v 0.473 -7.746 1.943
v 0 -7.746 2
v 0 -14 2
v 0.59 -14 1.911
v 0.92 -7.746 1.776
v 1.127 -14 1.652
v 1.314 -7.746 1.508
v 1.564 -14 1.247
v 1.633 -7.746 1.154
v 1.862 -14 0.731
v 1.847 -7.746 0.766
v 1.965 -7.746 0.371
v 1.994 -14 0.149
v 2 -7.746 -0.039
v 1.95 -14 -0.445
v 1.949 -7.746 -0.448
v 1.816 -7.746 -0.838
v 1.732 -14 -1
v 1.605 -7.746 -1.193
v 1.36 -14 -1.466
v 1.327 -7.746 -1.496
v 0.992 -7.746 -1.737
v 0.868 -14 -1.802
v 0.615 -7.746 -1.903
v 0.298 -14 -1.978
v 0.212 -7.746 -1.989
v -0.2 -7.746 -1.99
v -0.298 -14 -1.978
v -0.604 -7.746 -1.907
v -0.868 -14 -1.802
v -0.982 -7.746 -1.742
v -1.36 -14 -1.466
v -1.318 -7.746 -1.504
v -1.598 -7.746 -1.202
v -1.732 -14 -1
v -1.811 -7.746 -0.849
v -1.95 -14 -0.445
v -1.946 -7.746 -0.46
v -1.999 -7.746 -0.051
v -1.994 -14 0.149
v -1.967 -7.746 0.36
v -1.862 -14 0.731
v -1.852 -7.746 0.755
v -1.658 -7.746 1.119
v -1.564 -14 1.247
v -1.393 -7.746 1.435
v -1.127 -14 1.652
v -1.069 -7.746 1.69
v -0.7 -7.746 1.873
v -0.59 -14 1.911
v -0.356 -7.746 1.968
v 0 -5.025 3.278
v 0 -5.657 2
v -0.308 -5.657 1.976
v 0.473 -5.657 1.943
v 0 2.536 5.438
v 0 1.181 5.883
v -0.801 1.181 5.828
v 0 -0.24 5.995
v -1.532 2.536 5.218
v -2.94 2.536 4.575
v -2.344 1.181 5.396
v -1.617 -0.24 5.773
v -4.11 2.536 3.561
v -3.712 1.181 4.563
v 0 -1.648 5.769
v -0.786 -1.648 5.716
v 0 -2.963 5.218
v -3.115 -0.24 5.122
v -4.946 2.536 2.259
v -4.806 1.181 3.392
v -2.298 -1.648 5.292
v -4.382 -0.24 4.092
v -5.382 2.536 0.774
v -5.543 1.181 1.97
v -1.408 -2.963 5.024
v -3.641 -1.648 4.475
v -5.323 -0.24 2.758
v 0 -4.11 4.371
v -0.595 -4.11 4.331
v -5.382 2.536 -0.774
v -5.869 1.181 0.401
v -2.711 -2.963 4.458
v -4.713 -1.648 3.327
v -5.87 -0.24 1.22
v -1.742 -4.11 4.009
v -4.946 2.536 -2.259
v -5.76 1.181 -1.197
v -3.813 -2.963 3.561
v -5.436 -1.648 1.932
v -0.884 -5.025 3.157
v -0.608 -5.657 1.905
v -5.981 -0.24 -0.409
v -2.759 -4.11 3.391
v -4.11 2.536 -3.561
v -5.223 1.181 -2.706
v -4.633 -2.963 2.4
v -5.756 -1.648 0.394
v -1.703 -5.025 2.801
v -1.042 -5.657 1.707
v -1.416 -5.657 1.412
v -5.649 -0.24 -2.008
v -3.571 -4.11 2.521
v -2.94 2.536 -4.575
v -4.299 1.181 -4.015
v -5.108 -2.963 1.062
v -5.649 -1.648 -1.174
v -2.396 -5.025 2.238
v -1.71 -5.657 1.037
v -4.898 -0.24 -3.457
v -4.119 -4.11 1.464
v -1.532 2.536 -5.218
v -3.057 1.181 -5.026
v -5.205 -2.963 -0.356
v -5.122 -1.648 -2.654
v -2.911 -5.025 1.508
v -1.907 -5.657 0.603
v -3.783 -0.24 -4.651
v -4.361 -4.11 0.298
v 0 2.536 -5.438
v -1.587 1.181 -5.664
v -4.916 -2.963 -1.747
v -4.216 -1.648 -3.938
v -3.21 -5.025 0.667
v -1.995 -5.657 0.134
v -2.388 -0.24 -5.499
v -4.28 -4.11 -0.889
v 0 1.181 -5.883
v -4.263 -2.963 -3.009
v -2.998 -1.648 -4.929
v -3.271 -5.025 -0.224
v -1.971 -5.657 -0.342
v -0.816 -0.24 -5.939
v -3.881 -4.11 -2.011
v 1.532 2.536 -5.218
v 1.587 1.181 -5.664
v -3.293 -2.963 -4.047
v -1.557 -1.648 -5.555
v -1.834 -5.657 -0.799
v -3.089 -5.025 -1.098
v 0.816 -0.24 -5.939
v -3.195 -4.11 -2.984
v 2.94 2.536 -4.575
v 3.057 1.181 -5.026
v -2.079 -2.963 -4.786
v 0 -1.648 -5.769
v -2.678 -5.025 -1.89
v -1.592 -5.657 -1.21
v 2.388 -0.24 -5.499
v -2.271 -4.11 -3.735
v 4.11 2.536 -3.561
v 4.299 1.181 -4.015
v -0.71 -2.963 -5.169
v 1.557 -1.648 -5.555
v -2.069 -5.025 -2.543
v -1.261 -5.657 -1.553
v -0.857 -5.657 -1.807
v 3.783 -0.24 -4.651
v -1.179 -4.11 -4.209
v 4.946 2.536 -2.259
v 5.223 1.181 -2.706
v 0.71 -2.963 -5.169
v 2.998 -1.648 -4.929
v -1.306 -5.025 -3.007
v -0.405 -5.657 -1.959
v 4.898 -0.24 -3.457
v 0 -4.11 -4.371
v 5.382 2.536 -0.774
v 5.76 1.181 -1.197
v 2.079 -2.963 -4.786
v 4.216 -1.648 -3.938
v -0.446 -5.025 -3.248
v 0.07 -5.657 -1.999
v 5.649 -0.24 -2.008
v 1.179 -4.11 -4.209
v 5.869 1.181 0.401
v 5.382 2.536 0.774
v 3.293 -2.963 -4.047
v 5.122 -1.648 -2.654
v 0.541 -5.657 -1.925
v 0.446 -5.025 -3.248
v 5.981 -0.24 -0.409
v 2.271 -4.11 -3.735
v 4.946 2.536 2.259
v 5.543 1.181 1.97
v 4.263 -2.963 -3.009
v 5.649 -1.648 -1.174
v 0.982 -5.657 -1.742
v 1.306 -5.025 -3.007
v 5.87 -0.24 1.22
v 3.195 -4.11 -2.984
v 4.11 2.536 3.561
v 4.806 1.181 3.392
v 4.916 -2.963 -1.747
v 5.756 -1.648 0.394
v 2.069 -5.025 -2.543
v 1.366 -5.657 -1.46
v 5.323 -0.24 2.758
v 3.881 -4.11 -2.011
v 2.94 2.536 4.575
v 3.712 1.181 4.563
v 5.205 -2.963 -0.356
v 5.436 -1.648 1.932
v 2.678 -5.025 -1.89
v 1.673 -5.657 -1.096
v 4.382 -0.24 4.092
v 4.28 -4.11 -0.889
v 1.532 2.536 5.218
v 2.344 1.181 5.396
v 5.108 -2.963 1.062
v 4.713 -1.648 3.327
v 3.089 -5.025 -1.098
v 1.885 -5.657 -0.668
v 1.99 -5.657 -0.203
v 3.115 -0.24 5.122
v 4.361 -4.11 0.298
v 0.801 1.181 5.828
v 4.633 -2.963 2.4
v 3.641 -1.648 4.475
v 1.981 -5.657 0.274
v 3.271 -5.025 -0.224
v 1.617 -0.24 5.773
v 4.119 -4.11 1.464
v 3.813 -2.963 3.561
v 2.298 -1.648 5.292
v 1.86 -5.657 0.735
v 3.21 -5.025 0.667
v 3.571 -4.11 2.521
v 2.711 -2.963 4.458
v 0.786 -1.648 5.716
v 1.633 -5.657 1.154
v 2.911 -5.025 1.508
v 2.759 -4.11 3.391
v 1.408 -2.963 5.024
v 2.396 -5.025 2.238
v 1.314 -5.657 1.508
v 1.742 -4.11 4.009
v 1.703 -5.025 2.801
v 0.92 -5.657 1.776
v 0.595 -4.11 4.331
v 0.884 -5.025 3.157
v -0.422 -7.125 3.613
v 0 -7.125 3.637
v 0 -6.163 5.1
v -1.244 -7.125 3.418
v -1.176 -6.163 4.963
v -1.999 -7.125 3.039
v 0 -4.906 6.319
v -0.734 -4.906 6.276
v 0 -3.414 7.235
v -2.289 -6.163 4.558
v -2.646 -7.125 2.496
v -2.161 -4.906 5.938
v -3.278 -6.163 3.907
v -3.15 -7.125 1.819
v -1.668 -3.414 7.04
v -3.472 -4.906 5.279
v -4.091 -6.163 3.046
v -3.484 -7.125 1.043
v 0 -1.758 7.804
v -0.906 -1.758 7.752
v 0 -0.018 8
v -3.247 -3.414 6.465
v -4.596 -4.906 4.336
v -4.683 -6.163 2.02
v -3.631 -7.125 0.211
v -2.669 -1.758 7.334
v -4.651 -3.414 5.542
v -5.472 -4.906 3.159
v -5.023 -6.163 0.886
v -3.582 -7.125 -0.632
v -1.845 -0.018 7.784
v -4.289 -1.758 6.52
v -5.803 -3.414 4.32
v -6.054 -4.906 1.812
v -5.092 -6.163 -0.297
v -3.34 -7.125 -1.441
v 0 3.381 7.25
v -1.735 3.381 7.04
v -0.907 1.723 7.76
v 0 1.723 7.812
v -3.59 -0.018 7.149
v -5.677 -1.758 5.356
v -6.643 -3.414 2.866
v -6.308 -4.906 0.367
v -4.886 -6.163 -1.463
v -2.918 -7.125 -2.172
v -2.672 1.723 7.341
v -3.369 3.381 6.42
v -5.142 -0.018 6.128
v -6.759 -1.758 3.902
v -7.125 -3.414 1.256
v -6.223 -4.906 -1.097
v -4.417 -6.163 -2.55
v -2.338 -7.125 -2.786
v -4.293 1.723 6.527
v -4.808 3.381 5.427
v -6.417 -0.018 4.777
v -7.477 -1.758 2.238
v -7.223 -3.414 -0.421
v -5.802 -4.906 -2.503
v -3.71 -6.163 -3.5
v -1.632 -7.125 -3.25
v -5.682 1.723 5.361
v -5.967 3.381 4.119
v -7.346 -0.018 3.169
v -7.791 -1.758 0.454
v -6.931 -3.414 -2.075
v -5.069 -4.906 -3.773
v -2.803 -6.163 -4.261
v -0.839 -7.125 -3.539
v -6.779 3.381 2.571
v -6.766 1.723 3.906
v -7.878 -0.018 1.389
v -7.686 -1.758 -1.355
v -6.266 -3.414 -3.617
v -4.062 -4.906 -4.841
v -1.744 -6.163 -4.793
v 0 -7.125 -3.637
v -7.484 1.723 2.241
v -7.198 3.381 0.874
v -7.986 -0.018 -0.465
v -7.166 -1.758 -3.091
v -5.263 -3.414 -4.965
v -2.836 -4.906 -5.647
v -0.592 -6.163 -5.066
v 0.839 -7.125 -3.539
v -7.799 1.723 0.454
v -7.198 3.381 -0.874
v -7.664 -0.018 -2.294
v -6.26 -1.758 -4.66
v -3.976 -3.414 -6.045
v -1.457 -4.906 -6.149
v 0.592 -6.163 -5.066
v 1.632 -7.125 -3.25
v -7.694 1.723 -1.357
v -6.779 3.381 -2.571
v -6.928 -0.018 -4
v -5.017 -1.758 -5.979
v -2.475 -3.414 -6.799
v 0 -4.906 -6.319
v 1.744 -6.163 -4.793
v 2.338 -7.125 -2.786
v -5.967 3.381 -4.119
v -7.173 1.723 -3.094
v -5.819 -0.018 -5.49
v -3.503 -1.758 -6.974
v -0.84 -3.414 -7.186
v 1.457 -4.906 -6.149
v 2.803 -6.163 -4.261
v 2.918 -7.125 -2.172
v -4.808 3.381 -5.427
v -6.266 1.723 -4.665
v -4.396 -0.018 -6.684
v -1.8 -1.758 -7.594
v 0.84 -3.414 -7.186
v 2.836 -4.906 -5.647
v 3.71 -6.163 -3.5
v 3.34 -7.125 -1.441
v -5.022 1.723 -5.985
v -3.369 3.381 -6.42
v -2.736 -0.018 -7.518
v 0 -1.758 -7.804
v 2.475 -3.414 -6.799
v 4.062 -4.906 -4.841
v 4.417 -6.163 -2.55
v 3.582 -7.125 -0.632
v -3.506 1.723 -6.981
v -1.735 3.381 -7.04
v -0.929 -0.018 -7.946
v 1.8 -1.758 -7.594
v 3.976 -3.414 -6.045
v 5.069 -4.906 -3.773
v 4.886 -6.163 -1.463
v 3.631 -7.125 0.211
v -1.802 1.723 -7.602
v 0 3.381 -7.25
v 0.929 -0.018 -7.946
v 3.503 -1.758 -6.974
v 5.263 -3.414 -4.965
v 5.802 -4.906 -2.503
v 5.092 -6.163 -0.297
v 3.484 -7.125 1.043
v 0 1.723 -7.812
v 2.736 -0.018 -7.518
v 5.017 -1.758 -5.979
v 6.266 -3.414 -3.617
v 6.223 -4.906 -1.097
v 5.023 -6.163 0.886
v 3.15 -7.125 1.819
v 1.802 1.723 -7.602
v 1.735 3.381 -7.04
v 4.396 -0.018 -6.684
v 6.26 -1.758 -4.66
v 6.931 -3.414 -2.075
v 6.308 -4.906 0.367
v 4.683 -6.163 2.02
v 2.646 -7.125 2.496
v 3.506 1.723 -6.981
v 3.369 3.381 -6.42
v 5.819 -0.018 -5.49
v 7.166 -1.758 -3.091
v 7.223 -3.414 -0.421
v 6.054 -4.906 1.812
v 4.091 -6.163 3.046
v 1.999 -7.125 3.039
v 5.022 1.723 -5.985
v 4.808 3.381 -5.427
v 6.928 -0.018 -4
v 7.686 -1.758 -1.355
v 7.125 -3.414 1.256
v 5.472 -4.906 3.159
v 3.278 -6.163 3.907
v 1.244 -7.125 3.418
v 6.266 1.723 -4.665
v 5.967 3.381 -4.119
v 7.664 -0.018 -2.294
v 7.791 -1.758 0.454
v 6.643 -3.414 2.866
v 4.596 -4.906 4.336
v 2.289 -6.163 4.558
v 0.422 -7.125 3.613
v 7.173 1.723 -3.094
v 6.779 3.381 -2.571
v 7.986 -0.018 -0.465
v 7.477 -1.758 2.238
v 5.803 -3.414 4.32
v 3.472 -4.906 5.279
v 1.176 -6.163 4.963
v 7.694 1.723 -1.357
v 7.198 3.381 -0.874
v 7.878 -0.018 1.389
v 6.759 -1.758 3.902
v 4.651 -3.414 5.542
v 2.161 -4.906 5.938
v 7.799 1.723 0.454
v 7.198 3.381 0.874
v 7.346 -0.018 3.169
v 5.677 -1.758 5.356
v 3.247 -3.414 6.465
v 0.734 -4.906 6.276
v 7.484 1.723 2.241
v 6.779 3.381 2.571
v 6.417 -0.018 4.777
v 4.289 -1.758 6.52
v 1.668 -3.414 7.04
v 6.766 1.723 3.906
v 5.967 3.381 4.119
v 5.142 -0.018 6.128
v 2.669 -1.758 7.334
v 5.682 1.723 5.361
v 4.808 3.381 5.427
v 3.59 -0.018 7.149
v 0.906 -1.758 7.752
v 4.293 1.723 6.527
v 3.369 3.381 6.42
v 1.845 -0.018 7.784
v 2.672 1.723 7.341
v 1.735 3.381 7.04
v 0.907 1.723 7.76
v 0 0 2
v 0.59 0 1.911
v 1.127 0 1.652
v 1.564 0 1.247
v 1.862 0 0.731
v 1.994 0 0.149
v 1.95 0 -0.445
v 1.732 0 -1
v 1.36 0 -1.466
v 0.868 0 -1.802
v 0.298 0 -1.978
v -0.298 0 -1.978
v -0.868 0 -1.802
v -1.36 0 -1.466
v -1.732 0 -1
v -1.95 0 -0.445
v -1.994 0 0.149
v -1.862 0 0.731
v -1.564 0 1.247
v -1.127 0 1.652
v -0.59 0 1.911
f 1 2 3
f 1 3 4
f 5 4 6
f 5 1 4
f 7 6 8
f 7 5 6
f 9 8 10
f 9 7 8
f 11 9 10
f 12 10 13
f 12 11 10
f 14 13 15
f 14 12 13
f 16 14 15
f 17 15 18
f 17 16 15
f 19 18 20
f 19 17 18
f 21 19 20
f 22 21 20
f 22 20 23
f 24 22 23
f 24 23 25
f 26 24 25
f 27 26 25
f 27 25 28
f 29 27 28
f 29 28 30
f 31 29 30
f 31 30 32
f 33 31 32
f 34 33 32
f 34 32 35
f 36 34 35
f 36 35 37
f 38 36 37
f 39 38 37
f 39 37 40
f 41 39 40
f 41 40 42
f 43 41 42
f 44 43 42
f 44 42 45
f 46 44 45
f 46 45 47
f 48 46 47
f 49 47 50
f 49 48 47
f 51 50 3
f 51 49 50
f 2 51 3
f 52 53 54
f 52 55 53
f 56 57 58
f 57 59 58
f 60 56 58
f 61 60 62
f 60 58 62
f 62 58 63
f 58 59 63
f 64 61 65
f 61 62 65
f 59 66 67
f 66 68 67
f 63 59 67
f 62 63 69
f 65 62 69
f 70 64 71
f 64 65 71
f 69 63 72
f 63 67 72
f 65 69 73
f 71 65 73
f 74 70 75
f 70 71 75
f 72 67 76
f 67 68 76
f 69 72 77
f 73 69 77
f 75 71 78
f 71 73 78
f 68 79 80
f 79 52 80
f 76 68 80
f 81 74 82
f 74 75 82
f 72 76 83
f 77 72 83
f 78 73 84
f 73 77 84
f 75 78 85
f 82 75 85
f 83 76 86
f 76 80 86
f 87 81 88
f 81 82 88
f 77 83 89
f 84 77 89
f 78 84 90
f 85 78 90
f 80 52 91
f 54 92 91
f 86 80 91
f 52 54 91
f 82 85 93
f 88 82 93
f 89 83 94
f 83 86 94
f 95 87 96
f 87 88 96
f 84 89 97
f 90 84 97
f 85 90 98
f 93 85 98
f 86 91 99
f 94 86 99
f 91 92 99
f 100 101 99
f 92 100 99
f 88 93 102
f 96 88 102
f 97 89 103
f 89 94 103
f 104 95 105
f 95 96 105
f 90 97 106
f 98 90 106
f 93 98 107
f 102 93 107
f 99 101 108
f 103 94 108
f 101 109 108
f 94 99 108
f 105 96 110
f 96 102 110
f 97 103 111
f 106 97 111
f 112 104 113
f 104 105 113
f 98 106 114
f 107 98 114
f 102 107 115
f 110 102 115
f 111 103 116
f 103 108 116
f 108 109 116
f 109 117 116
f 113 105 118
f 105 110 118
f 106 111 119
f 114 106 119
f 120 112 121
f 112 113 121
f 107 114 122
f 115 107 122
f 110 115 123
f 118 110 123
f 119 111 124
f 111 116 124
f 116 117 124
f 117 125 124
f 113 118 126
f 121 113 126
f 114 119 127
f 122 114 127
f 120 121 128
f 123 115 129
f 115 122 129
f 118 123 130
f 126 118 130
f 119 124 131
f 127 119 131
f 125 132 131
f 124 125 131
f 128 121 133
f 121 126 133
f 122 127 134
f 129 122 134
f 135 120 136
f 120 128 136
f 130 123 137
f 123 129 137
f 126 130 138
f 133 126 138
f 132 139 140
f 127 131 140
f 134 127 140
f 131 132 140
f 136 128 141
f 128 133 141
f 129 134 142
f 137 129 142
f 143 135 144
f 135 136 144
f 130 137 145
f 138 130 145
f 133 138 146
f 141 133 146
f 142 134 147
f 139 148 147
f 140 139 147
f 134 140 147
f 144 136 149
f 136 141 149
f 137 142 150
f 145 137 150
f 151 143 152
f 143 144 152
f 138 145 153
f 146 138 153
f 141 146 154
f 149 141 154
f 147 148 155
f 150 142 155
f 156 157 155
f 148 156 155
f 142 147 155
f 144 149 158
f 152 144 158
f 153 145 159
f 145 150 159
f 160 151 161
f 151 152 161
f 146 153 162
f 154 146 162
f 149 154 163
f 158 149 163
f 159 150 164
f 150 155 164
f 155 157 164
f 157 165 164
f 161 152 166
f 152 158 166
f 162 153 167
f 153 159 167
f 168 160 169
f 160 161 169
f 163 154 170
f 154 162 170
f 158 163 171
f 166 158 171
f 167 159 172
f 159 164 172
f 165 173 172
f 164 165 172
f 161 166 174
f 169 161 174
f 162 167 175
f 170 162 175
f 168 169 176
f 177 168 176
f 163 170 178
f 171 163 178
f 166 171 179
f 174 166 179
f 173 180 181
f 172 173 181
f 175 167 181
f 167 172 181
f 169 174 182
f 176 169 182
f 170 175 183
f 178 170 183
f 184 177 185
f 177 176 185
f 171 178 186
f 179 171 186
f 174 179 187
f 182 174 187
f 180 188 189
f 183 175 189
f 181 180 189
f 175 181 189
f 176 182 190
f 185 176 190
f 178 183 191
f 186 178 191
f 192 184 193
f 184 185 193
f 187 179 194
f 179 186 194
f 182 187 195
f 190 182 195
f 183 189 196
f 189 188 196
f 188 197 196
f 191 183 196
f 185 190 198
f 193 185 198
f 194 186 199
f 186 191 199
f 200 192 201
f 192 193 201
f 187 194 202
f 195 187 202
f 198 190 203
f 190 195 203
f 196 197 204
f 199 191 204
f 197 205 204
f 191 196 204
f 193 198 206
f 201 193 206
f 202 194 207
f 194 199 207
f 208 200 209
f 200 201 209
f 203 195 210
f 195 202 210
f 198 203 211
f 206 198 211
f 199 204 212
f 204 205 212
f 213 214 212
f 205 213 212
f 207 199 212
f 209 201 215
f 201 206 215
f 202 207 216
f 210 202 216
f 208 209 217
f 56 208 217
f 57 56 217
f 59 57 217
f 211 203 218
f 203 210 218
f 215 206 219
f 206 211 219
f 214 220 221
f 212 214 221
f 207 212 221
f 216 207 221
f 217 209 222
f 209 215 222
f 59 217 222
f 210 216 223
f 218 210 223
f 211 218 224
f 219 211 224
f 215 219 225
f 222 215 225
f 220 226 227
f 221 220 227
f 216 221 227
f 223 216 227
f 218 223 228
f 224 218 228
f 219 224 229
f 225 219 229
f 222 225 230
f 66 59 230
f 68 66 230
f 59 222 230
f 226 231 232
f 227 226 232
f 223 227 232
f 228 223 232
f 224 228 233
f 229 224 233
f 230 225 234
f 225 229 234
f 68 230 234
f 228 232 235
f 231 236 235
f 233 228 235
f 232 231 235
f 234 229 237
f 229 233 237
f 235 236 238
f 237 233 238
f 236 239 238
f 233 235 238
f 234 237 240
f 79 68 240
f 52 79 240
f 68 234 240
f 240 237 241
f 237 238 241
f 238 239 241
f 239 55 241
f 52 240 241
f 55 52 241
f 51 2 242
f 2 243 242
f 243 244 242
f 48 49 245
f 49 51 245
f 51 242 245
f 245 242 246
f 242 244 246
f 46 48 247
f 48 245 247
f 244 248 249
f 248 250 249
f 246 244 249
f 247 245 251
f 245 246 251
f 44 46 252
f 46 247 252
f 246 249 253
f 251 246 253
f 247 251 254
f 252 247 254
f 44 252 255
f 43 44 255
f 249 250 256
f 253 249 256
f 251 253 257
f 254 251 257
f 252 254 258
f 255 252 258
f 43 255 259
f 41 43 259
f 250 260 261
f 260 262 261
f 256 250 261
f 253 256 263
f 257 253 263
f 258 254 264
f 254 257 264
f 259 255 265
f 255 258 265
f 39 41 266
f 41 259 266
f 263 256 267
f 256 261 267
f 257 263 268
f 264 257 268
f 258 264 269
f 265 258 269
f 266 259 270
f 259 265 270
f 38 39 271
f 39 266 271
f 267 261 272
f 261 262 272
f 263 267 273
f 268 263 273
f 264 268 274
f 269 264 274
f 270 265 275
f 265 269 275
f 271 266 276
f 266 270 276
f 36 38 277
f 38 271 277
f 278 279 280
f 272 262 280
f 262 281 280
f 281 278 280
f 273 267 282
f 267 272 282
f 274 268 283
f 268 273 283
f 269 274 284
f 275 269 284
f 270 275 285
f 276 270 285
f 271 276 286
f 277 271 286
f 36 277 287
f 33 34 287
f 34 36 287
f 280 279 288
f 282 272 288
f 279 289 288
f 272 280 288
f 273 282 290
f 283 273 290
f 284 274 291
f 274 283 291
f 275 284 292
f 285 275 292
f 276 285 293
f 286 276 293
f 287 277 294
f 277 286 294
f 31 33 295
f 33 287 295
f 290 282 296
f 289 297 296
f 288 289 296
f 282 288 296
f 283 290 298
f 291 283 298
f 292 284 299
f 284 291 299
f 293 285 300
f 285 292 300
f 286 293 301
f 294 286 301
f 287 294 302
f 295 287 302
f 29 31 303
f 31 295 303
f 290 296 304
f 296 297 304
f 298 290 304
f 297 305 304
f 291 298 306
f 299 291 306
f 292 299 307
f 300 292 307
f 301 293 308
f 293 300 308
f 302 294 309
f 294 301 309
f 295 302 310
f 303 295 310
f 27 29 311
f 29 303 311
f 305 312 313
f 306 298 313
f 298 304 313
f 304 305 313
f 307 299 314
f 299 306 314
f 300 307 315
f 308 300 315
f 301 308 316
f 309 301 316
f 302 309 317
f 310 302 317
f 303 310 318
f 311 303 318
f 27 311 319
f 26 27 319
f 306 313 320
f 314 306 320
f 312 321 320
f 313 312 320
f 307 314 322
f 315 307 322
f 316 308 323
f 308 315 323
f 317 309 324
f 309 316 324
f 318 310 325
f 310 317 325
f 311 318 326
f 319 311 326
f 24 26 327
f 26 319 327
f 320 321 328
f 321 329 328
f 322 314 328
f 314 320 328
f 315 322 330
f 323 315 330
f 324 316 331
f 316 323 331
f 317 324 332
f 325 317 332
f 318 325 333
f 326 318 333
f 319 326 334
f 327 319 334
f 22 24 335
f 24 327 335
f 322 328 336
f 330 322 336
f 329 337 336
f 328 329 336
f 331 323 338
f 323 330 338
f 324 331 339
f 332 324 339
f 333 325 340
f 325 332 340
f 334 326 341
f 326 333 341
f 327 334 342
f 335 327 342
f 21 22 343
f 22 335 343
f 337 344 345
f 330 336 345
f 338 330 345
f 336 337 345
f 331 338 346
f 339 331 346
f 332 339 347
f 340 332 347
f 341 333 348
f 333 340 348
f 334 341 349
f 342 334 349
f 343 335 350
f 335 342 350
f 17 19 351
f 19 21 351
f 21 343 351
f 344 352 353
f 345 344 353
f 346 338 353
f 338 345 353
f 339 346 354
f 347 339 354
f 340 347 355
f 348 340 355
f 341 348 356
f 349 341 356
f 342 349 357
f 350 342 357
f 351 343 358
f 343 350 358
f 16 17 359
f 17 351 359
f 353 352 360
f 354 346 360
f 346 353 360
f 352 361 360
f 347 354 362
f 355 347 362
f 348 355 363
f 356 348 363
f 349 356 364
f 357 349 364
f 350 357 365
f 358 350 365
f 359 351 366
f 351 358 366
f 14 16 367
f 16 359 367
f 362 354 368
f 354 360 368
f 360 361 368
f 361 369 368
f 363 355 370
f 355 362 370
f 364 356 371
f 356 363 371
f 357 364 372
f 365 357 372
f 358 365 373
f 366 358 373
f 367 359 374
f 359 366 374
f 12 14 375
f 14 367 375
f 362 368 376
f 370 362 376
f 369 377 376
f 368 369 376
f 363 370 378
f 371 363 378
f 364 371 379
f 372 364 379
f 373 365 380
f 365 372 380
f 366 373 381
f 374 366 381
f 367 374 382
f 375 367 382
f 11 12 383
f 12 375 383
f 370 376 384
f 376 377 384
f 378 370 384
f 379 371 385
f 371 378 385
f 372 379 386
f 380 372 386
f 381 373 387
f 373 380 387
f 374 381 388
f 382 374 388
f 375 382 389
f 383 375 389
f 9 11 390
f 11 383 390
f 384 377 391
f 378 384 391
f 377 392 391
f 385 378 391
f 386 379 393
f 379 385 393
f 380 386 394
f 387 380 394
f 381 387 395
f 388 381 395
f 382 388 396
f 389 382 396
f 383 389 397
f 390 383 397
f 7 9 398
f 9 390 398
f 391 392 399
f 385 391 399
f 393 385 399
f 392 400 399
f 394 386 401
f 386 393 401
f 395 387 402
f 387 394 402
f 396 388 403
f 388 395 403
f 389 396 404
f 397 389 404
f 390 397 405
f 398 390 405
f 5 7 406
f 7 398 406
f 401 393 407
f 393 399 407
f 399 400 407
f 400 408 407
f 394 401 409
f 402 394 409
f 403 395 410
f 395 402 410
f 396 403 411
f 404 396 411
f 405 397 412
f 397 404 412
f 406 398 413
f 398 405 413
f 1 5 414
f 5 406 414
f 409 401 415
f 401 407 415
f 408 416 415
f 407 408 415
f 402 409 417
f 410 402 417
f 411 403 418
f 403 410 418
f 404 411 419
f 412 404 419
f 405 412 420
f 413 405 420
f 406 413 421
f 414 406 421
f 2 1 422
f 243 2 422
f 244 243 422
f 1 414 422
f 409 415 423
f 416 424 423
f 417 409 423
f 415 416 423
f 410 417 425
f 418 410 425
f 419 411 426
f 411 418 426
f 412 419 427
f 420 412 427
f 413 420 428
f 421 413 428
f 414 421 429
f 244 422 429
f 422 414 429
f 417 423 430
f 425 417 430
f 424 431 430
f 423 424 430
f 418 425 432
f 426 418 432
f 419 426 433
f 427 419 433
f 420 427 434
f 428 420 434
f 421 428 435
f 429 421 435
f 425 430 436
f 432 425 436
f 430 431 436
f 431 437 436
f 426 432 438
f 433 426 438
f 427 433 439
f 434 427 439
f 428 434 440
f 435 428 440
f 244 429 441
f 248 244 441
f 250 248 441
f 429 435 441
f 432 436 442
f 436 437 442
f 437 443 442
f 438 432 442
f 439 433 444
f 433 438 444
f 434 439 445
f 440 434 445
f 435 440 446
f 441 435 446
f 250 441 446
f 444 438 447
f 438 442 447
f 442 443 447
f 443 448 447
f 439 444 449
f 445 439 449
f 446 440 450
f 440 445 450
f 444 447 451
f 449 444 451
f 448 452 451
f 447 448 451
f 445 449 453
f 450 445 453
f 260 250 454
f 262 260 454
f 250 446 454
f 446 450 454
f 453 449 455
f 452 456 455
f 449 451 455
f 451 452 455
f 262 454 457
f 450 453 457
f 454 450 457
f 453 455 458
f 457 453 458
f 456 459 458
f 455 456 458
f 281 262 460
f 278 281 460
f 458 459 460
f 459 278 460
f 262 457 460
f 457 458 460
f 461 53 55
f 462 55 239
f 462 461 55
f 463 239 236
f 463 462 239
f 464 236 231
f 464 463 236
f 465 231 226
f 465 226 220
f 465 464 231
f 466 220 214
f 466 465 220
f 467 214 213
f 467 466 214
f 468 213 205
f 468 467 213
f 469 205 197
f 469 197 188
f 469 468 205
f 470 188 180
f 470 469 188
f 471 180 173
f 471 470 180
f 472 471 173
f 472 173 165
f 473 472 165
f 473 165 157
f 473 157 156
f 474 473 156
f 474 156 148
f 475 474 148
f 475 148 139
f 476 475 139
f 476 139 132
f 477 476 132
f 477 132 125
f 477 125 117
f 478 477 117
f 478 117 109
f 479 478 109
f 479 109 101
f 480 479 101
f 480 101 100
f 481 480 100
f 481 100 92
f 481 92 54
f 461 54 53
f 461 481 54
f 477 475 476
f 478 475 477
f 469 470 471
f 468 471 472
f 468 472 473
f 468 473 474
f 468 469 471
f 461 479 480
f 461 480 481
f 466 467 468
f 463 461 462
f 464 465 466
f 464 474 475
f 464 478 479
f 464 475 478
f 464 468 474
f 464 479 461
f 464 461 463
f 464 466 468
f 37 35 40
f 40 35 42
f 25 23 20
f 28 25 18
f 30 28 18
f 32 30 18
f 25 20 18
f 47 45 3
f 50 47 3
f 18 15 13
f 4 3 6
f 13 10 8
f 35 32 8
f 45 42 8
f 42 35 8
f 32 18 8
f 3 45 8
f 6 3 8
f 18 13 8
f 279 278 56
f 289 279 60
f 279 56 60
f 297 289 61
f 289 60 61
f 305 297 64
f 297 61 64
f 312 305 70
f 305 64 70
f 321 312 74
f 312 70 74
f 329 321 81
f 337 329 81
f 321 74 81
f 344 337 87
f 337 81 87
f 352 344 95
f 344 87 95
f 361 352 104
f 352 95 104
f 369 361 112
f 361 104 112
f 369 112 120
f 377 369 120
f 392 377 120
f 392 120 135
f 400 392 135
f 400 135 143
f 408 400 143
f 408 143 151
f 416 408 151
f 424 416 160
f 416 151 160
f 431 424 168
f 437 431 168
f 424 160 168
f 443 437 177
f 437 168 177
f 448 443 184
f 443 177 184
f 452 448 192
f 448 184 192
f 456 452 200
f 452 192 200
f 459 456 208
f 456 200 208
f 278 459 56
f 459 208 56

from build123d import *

# Parameters (mm, degrees)
ESQUISSE2_R        = 2
BOSS_EXTRU_1_DEPTH = 14


with BuildPart() as part:
    # Esquisse1 → Révolution1 (revolve)
    with BuildSketch(Plane.XY, mode=Mode.PRIVATE) as r_volution1_sk:
        with BuildLine():
            Line((-7.250462296, 3.380946094), (-5.437846722, 2.53570957))
            ThreePointArc((-5.437846722, 2.53570957), (-5.060348675, -3.22379765), (0, -6))
            Line((0, -6), (0, -8))
            ThreePointArc((0, -8), (-6.747131567, -4.298396867), (-7.250462296, 3.380946094))
        make_face()
    revolve(r_volution1_sk.sketch.rotate(Axis((0, 0, 0), (0, -1, 0)), 270), axis=Axis((0, 0, 0), (0, -1, 0)))

    # Esquisse2 → Boss.-Extru.1 (add)
    with BuildSketch(Plane(origin=(0, 0, 0), x_dir=(1, 0, 0), z_dir=(0, 1, 0))):
        with Locations(Location((0, 0, 0), (0, 0, 270))):
            Circle(ESQUISSE2_R)
    extrude(amount=-BOSS_EXTRU_1_DEPTH)


solid = part.part
